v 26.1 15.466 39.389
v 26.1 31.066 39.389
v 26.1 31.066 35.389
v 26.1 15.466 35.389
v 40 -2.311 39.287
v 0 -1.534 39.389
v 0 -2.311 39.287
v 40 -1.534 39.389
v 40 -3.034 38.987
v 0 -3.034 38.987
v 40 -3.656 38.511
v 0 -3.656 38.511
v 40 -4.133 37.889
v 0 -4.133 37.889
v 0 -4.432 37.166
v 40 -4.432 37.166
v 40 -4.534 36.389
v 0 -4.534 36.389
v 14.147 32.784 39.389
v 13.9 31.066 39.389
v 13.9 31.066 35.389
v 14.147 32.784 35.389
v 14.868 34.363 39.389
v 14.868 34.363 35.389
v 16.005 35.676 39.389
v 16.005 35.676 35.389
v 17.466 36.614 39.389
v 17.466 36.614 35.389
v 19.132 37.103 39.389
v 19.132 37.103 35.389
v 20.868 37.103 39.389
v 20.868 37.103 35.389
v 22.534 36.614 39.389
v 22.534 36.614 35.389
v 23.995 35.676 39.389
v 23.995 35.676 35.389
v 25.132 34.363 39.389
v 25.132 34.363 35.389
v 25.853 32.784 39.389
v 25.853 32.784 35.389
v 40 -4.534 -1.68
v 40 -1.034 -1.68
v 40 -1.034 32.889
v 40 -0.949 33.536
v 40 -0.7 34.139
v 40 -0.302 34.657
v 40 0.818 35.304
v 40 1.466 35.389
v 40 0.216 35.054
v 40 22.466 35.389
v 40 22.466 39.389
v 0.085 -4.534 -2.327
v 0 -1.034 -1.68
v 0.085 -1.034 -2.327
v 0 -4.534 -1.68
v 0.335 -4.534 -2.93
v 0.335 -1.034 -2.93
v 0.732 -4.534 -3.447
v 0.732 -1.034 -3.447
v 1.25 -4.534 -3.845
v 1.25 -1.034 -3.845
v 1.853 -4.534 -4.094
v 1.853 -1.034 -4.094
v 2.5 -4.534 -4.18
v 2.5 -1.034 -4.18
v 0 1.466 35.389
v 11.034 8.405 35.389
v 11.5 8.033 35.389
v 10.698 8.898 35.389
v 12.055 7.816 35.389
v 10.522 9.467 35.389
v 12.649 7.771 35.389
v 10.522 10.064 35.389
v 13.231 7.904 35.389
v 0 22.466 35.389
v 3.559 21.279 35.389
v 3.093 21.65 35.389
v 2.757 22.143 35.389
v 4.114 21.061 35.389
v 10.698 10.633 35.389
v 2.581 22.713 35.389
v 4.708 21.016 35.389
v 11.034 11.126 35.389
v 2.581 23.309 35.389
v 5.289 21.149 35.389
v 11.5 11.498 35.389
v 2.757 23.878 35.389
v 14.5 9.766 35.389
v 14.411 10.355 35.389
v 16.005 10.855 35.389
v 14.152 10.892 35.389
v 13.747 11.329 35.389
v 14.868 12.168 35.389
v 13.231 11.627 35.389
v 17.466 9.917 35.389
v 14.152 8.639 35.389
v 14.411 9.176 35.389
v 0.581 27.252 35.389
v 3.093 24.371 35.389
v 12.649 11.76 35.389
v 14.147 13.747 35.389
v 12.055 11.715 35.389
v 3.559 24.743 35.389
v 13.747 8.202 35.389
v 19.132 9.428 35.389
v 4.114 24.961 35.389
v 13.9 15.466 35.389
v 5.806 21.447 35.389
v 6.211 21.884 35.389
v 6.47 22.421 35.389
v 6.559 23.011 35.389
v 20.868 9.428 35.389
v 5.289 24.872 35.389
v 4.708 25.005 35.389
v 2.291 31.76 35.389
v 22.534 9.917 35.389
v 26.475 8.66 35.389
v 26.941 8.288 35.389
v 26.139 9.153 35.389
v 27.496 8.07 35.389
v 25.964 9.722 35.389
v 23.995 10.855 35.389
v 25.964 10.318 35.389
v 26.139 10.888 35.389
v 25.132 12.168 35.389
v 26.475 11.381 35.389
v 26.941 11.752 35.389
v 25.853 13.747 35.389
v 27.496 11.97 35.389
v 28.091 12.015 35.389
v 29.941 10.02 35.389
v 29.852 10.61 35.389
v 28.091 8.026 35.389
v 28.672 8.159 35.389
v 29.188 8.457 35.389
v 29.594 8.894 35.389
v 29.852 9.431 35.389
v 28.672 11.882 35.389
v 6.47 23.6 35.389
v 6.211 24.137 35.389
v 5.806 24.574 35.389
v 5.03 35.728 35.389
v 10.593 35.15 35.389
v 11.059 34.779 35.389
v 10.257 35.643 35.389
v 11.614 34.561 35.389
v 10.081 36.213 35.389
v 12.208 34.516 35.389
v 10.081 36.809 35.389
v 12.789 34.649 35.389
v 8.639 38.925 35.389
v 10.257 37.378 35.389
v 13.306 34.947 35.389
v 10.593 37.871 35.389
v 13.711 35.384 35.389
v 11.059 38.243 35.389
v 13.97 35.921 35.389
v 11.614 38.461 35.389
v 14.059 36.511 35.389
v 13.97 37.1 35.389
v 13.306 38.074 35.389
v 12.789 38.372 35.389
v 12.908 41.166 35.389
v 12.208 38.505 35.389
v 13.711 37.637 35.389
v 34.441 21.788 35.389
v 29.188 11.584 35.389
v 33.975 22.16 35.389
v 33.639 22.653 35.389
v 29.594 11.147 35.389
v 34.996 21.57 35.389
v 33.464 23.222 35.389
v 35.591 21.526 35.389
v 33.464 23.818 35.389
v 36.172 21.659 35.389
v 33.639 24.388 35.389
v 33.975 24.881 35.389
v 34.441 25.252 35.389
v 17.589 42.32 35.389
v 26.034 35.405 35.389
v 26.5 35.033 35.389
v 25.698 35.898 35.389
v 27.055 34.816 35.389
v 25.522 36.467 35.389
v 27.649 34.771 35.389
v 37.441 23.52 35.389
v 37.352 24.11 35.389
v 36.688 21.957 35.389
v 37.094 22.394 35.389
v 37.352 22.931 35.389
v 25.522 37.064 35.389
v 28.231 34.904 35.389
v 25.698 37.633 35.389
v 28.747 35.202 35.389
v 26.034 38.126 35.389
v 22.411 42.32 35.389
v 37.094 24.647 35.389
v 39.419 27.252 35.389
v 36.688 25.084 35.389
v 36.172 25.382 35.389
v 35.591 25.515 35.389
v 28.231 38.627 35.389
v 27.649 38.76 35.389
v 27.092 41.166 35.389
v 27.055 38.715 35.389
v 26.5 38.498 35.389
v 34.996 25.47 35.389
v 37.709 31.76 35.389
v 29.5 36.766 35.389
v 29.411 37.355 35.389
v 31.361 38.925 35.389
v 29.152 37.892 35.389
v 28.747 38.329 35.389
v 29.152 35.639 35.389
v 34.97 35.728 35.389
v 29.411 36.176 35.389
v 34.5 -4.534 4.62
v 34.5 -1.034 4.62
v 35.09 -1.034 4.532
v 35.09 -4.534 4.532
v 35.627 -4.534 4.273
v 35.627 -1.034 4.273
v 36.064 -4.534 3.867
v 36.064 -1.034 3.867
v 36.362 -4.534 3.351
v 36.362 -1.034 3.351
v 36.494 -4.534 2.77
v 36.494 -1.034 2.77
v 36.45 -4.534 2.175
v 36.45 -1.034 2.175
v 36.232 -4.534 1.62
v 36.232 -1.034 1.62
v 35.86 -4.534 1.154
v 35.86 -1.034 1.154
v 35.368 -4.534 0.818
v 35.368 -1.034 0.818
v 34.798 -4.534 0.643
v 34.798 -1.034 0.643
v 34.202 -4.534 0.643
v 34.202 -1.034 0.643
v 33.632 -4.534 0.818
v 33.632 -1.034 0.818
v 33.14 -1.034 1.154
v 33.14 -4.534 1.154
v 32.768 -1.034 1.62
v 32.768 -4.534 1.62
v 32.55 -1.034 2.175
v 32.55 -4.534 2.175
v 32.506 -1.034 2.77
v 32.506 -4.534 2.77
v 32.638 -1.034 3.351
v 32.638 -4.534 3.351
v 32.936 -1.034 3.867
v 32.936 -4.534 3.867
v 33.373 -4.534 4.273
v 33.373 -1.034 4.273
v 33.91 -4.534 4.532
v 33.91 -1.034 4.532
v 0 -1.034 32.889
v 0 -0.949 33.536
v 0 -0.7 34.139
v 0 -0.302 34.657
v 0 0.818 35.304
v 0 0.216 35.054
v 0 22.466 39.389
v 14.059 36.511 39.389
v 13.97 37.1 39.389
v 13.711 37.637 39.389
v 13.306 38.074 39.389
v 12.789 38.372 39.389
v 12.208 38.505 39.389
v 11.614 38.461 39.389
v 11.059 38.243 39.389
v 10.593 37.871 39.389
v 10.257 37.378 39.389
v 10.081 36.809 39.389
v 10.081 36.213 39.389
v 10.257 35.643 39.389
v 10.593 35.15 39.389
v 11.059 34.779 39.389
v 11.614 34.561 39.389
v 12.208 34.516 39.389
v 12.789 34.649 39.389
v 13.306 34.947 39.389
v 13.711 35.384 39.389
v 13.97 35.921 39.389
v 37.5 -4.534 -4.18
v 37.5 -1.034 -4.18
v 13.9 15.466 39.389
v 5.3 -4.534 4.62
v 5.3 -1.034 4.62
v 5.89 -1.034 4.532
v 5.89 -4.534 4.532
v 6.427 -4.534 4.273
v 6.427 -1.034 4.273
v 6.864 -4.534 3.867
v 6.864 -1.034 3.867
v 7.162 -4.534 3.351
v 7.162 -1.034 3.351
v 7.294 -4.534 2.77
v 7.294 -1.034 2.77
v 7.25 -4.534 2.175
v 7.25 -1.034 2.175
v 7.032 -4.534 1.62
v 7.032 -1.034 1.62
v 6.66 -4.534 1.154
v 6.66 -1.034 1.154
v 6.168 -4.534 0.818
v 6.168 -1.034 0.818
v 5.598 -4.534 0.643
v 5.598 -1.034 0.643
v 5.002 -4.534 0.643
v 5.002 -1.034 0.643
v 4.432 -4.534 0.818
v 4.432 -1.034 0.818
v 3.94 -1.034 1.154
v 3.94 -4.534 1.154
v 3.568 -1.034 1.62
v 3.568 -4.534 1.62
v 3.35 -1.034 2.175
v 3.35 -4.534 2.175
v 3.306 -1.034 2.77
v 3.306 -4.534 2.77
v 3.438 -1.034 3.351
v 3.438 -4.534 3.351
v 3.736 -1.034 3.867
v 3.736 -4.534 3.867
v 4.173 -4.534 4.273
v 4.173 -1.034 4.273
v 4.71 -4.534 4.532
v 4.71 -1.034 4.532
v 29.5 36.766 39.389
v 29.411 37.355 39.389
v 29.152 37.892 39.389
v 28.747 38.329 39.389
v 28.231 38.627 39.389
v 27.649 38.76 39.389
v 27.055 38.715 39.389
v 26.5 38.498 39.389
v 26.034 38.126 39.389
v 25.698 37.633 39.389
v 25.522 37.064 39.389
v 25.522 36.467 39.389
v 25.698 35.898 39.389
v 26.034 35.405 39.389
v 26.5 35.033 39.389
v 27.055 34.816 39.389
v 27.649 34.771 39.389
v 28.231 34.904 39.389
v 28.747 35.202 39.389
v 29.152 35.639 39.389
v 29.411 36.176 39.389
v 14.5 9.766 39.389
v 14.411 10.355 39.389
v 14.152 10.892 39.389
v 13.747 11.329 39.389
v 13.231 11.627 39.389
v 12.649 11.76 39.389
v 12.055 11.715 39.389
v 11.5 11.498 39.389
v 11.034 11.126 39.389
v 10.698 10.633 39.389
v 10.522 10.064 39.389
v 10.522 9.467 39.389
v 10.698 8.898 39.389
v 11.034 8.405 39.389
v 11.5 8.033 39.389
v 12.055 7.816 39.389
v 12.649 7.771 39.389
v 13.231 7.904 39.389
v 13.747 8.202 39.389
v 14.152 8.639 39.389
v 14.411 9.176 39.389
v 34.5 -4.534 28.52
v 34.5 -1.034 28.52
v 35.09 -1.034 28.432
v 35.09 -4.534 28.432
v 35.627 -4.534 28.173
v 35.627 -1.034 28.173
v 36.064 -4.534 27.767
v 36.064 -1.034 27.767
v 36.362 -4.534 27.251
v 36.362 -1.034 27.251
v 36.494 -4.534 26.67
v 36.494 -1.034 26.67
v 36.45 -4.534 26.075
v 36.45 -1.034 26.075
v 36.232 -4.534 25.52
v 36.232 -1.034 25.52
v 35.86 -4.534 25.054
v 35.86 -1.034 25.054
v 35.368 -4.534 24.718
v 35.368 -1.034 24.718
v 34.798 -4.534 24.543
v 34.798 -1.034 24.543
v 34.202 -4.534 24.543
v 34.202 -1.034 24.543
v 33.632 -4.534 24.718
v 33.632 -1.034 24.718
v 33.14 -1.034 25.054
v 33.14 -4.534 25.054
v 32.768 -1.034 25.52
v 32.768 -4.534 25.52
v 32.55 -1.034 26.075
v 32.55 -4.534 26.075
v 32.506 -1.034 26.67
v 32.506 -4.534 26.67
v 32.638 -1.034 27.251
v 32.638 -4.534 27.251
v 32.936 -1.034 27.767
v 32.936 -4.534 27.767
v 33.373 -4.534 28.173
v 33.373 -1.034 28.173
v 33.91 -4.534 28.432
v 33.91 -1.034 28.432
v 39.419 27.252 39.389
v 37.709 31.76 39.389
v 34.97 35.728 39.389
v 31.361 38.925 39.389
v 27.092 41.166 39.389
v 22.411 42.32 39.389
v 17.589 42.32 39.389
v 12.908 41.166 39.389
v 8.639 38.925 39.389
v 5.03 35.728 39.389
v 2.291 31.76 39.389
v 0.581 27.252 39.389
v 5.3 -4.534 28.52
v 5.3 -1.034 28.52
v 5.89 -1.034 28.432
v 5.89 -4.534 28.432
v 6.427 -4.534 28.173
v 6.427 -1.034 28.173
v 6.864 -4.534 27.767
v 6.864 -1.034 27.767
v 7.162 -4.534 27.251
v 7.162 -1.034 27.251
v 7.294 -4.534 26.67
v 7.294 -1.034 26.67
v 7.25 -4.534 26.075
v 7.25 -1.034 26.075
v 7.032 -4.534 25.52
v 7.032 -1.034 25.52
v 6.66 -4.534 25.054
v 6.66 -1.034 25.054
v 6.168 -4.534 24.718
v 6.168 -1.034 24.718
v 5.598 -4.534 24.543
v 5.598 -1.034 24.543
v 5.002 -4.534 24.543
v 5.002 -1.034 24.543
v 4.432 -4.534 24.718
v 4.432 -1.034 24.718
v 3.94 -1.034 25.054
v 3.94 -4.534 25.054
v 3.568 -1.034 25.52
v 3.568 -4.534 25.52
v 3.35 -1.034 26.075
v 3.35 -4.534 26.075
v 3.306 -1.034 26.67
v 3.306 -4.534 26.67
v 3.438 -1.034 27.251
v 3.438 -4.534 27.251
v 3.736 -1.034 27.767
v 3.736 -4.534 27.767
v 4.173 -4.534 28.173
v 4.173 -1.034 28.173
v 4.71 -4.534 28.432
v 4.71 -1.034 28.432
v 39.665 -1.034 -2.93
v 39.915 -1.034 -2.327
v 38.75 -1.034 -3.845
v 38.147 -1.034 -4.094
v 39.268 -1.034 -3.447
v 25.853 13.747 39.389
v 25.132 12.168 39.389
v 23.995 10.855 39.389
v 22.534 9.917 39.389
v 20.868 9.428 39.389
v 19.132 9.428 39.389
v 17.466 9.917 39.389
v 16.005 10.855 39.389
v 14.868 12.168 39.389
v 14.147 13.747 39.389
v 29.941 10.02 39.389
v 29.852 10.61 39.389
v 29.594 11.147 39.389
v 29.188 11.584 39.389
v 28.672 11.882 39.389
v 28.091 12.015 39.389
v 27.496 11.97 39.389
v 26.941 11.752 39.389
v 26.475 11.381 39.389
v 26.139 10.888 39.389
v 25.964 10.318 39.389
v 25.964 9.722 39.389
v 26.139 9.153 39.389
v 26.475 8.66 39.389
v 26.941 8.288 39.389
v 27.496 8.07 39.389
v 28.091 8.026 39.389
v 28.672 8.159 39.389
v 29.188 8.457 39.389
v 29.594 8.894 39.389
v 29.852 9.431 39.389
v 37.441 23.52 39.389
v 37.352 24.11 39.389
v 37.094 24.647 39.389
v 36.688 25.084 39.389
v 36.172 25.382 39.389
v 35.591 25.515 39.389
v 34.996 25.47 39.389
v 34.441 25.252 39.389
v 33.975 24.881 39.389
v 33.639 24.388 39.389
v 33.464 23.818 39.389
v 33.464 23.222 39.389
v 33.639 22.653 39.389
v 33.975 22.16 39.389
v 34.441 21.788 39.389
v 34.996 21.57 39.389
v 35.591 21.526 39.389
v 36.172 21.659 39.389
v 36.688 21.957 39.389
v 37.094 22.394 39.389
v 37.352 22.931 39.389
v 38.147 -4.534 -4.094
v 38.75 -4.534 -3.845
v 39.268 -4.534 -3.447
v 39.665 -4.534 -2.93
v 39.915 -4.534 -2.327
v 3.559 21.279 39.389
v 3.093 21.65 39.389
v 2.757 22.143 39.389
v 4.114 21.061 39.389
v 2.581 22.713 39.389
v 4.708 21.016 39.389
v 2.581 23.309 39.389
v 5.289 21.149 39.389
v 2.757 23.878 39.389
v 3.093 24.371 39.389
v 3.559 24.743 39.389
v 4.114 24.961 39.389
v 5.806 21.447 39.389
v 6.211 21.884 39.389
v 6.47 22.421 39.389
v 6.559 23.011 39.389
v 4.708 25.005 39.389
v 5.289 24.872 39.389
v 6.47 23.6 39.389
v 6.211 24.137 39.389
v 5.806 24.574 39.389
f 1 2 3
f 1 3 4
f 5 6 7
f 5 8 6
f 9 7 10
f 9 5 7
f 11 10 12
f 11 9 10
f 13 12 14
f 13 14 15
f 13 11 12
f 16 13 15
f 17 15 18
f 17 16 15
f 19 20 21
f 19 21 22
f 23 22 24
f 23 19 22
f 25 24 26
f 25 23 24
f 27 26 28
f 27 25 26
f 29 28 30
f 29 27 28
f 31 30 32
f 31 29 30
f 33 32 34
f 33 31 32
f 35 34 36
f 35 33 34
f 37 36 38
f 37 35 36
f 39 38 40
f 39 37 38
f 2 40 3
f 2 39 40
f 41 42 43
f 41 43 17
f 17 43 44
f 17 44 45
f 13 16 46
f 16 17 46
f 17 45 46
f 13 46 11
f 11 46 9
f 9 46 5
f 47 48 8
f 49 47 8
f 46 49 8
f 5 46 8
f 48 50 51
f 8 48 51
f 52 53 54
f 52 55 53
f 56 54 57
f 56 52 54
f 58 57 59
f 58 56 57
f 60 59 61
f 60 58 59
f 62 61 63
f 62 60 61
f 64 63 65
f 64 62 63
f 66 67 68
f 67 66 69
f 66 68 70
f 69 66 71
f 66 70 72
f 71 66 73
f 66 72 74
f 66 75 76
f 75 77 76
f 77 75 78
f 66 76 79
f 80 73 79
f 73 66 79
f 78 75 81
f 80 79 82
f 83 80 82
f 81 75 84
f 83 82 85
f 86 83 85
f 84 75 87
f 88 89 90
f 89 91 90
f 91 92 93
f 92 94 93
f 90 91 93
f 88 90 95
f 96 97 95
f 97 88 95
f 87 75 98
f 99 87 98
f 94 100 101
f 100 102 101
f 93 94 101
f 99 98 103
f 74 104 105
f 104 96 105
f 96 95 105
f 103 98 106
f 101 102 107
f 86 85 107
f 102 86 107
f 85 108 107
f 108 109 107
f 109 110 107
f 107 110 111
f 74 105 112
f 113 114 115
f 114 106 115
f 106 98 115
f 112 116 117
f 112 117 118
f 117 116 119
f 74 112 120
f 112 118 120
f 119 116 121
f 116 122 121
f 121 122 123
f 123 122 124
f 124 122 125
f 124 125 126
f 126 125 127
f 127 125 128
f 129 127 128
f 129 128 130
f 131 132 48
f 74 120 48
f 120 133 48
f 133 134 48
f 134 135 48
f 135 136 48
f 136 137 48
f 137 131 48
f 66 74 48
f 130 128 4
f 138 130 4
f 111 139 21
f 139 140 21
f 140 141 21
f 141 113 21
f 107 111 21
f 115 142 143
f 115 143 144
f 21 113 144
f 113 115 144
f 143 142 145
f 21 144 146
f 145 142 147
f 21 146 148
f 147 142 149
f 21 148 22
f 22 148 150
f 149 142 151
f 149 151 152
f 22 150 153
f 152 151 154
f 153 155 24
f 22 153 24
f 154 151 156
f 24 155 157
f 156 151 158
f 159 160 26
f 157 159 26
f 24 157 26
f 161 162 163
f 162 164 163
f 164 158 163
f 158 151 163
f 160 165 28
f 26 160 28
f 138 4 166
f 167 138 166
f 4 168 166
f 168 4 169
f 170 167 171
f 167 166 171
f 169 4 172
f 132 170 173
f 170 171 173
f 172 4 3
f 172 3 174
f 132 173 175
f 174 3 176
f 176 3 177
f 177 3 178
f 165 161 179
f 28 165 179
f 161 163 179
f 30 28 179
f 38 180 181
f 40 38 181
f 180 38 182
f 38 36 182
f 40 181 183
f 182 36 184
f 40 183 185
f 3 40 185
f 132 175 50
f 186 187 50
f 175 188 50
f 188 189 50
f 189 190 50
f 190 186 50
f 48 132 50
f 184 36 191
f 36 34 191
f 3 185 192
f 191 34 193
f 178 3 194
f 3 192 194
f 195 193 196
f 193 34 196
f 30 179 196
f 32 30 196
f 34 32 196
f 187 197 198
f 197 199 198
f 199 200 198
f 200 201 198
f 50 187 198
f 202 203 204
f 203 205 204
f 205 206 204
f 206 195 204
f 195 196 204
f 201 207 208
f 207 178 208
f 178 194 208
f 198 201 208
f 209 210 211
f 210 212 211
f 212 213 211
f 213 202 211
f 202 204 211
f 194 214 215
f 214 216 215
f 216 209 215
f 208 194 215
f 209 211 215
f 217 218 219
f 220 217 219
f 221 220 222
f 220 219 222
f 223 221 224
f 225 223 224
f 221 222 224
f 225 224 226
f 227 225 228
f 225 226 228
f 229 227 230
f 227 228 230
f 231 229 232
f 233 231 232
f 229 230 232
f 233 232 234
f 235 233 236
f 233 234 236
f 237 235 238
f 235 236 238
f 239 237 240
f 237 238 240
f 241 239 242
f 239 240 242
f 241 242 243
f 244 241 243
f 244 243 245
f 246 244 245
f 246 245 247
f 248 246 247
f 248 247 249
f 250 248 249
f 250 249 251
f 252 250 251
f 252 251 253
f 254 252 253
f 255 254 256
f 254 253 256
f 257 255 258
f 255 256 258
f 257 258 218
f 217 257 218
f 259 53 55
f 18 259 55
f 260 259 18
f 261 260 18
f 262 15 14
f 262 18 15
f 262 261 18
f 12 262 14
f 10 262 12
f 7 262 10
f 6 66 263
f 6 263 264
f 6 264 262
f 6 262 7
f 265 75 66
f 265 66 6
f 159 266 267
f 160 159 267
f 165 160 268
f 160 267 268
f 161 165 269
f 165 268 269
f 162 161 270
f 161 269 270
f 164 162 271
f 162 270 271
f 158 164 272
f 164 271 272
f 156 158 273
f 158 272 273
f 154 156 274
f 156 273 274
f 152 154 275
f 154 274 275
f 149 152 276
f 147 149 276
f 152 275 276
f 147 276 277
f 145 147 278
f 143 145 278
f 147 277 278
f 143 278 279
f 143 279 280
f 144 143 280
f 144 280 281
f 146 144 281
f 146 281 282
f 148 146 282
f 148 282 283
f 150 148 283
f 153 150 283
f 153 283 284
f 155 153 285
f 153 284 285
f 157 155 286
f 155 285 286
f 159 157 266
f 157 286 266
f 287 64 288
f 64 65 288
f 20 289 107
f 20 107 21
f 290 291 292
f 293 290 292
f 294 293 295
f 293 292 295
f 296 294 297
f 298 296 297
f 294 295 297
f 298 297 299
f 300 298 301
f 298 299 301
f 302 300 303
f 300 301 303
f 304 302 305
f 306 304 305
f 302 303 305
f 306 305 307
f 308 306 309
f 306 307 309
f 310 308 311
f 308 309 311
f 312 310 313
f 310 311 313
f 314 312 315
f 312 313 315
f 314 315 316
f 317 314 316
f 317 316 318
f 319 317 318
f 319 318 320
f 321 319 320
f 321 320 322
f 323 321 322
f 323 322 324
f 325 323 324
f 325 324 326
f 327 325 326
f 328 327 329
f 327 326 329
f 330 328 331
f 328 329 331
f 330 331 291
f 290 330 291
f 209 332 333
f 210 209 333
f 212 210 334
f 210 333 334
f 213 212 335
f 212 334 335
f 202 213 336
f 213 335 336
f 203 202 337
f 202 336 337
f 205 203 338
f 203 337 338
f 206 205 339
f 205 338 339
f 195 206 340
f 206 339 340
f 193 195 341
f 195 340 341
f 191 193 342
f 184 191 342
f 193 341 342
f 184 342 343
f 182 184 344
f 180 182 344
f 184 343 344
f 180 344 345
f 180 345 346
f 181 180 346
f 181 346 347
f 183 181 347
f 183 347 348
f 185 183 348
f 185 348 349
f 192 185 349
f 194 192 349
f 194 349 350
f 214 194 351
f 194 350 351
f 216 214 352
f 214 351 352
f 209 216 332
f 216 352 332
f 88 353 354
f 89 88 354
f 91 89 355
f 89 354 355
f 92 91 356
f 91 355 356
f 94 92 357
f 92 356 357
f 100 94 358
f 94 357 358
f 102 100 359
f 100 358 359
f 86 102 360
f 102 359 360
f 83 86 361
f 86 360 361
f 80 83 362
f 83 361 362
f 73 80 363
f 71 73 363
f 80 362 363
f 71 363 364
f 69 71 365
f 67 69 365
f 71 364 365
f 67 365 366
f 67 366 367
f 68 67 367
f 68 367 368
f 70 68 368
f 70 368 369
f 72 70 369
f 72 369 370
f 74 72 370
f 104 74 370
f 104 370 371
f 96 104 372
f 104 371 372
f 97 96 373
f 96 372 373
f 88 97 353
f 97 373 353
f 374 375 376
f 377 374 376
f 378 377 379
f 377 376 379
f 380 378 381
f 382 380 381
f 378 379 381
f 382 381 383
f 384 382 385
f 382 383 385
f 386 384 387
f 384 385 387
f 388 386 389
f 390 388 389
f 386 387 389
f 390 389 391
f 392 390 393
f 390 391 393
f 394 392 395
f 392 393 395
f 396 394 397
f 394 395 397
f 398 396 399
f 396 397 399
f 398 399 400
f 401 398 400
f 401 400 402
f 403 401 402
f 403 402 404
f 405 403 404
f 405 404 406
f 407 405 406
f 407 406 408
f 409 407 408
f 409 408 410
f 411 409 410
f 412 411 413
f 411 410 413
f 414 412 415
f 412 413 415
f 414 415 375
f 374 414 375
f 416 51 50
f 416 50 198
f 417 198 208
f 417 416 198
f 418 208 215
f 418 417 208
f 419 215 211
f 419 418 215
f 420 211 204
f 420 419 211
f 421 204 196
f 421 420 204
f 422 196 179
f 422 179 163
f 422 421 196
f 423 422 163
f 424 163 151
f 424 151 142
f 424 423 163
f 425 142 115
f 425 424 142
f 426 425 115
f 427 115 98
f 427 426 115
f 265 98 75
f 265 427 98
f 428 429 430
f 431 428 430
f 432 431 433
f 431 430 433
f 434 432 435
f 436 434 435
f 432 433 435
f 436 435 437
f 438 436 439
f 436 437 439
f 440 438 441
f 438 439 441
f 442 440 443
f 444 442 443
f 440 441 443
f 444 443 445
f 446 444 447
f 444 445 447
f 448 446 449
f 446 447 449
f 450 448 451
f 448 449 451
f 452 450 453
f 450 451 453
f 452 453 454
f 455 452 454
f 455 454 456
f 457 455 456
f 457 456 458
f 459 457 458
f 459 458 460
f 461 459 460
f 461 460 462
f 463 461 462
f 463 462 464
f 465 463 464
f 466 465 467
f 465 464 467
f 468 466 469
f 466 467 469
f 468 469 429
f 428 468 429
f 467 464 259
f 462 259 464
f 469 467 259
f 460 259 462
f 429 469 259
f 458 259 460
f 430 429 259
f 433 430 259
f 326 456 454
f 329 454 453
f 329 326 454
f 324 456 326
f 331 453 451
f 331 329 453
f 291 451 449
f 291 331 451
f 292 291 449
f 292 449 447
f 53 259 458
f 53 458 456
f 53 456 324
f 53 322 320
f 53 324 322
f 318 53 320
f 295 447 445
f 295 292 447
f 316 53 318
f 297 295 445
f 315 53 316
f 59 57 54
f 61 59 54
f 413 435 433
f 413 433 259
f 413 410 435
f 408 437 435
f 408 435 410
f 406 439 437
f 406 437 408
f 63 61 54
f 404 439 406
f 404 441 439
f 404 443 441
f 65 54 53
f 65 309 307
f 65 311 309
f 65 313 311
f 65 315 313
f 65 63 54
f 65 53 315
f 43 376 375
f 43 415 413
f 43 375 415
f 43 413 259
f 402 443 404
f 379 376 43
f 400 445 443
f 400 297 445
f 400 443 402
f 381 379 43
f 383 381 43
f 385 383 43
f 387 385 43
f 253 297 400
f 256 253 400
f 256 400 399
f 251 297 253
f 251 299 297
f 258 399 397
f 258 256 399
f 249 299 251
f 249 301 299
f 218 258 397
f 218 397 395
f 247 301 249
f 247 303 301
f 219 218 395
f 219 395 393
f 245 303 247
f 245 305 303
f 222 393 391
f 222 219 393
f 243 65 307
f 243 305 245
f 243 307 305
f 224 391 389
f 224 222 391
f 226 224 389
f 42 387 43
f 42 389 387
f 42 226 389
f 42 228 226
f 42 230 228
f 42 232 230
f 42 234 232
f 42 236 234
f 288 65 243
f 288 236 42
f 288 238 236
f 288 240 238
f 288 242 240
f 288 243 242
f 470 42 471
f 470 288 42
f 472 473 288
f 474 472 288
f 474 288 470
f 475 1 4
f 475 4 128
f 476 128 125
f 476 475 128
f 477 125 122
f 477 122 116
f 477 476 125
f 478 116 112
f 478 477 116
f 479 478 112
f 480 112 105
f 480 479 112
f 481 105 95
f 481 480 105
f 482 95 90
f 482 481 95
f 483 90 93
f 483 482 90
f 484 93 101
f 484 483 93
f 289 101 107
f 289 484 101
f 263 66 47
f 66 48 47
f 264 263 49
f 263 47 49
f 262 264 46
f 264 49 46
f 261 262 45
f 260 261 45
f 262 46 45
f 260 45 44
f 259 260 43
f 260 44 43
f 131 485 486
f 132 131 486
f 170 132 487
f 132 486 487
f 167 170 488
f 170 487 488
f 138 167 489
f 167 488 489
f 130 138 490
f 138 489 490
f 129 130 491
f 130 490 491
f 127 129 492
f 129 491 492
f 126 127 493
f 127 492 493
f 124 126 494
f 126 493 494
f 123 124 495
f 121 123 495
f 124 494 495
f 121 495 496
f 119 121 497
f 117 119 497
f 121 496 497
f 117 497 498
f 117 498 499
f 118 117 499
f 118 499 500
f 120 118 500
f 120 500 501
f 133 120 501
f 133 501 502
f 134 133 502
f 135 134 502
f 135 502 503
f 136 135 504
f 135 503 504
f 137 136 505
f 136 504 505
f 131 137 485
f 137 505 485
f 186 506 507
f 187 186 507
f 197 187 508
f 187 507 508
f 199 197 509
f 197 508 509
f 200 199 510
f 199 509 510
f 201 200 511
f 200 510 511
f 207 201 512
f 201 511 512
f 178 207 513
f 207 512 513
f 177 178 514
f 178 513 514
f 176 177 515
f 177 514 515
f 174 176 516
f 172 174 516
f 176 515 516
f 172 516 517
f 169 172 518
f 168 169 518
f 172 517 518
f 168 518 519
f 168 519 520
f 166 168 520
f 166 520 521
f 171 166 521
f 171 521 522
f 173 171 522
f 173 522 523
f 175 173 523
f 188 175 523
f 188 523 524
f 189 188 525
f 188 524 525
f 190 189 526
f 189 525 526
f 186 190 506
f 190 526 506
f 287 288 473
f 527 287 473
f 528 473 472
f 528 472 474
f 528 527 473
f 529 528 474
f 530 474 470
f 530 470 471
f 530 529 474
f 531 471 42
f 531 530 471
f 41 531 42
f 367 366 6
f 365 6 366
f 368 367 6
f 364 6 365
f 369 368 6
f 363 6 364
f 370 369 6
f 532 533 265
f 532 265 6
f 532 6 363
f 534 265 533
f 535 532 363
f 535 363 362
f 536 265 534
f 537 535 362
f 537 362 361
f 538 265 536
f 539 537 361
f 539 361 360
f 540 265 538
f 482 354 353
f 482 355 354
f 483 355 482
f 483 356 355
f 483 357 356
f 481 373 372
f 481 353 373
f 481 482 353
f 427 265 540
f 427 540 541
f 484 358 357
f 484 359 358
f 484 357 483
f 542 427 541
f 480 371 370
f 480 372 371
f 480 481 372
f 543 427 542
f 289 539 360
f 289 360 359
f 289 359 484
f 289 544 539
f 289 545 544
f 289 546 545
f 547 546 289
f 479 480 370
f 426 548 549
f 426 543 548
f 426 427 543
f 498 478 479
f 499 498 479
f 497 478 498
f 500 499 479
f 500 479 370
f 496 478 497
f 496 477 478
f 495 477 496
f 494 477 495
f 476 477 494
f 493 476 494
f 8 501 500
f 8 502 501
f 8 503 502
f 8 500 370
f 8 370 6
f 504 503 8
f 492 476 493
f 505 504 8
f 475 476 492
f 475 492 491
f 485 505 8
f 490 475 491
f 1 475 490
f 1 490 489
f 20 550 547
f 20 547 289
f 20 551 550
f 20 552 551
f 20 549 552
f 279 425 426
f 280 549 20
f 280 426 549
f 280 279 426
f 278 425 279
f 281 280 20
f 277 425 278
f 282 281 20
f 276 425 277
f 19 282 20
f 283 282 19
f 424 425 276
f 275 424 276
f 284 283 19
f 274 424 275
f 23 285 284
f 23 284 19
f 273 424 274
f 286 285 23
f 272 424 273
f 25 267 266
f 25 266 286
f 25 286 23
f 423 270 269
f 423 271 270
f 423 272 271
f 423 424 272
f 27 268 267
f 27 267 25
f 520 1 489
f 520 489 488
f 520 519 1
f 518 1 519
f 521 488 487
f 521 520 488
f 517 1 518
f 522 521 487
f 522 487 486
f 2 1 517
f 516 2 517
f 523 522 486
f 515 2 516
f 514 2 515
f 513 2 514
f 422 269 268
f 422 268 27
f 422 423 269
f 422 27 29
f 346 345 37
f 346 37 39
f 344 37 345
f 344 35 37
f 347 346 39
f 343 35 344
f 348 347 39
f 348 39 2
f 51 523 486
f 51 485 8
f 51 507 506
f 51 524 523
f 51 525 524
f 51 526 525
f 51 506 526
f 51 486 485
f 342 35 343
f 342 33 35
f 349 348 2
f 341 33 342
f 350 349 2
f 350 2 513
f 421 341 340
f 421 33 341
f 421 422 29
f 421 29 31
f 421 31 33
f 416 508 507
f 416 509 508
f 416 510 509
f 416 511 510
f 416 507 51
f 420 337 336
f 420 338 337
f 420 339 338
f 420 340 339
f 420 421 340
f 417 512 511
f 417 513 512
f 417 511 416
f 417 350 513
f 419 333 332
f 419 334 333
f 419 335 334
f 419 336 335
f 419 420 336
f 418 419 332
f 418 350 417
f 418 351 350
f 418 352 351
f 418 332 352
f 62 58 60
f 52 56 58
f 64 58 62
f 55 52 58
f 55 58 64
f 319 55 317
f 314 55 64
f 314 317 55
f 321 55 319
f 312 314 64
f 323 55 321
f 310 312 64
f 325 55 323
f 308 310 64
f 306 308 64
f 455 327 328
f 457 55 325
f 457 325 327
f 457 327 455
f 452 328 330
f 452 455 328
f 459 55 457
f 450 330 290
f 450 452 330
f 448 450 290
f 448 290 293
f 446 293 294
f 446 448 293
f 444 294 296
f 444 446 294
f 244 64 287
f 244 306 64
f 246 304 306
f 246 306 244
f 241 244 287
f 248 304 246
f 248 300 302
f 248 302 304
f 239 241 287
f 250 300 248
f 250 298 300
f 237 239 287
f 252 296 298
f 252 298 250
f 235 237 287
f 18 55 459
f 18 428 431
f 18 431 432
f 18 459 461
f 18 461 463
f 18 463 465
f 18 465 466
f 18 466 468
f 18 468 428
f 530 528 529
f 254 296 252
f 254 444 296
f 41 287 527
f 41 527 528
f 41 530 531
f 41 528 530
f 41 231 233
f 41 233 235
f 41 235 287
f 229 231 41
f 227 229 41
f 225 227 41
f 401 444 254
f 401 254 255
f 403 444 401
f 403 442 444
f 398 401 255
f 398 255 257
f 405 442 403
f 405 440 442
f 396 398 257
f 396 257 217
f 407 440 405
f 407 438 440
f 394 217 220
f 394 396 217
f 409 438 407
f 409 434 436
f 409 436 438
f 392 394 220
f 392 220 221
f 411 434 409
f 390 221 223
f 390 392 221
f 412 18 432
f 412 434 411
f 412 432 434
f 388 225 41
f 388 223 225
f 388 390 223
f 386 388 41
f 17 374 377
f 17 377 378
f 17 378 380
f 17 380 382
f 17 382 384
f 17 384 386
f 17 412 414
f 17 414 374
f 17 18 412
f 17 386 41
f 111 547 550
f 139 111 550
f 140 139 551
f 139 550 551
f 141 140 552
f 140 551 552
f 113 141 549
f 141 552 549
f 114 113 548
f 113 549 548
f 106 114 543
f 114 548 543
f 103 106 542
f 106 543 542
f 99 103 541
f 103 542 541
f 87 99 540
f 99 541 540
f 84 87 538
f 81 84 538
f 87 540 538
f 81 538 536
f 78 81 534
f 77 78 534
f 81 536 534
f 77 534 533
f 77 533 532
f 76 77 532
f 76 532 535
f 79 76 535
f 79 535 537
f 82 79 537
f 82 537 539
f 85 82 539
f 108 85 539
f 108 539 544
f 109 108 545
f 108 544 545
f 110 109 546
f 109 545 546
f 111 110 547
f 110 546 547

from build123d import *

# Parameters (mm, degrees)
SKETCH2_W           = 1.5
SKETCH2_H           = 37.57
SKETCH2_H_2         = 1.5
SKETCH2_W_2         = 39.569
BOSS_EXTRUDE1_DEPTH = 40
SKETCH3_R           = 1.65
CUT_EXTRUDE1_DEPTH  = 40
SKETCH4_R           = 10.5
SKETCH4_R_2         = 1.65
CUT_EXTRUDE2_DEPTH  = 40
SKETCH_1_R          = 10.5
SKETCH_1_R_2        = 1.65
EXTRUDE_1_DEPTH     = 2.5
FILLET_1_R          = 2.5
SKETCH_2_W          = 40
SKETCH_2_H          = 43.569
SKETCH_2_R          = 1.65
EXTRUDE_2_DEPTH     = 2
FILLET_2_R          = 2.5
SKETCH_3_R          = 1.65
EXTRUDE_3_DEPTH     = 3.5
SKETCH_4_R          = 2
CUT_EXTRUDE_1_DEPTH = 3.5
FILLET_3_R          = 3
SKETCH_5_W          = 40
SKETCH_5_H          = 4
EXTRUDE_4_DEPTH     = 27
FILLET_4_R          = 3
EXTRUDE_5_DEPTH     = 4
CUT_EXTRUDE_2_DEPTH = 4
SKETCH_10_R         = 2
CUT_EXTRUDE_3_DEPTH = 4


with BuildPart() as part:
    # Sketch2 → Boss-Extrude1 (new body)
    with BuildSketch(Plane(origin=(0, 0, 0), x_dir=(0, 0, -1), z_dir=(1, 0, 0))):
        with Locations((-36.139408466, 17.750517241)):
            Rectangle(SKETCH2_W, SKETCH2_H)
        with Locations((-36.139408466, -1.784482759)):
            Rectangle(SKETCH2_W, SKETCH2_H_2)
        with Locations((-15.604908466, -1.784482759)):
            Rectangle(SKETCH2_W_2, SKETCH2_H_2)
    extrude(amount=BOSS_EXTRUDE1_DEPTH)

    # Sketch3 → Cut-Extrude1 (cut)
    with BuildSketch(Plane(origin=(0, -1.034482759, 0), x_dir=(1, 0, 0), z_dir=(0, 1, 0))):
        with Locations(Location((4.5, -30.820408466, 0), (0, 0, 270))):
            Circle(SKETCH3_R)
        with Locations(Location((4.5, -20.820408466, 0), (0, 0, 270))):
            Circle(SKETCH3_R)
        with Locations(Location((4.5, -10.820408466, 0), (0, 0, 270))):
            Circle(SKETCH3_R)
        with Locations(Location((4.5, -0.820408466, 0), (0, 0, 270))):
            Circle(SKETCH3_R)
        with Locations(Location((35.5, -30.820408466, 0), (0, 0, 270))):
            Circle(SKETCH3_R)
        with Locations(Location((35.5, -20.820408466, 0), (0, 0, 270))):
            Circle(SKETCH3_R)
        with Locations(Location((35.5, -10.820408466, 0), (0, 0, 270))):
            Circle(SKETCH3_R)
        with Locations(Location((35.5, -0.820408466, 0), (0, 0, 270))):
            Circle(SKETCH3_R)
    extrude(amount=-CUT_EXTRUDE1_DEPTH, mode=Mode.SUBTRACT)

    # Sketch4 → Cut-Extrude2 (cut)
    with BuildSketch(Plane(origin=(0, 0, 35.389408466), x_dir=(-1, 0, 0), z_dir=(0, 0, -1))):
        with Locations(Location((-20, 16.535517241, 0), (0, 0, 90))):
            Circle(SKETCH4_R)
        with Locations(Location((-11.070998723, 25.983952889, 0), (0, 0, 90))):
            Circle(SKETCH4_R_2)
        with Locations(Location((-10.551564352, 7.606515964, 0), (0, 0, 90))):
            Circle(SKETCH4_R_2)
        with Locations(Location((-29.448435648, 25.464518519, 0), (0, 0, 90))):
            Circle(SKETCH4_R_2)
        with Locations(Location((-28.929001277, 7.087081594, 0), (0, 0, 90))):
            Circle(SKETCH4_R_2)
        with BuildLine():
            Line((-40, 36.535517241), (-40, 16.535517241))
            ThreePointArc((-40, 16.535517241), (-34.142135624, 30.677652865), (-20, 36.535517241))
            Line((-20, 36.535517241), (-40, 36.535517241))
        make_face()
        with BuildLine():
            Line((0, 36.535517241), (-20, 36.535517241))
            ThreePointArc((-20, 36.535517241), (-5.857864785, 30.677653274), (0, 16.535518399))
            Line((0, 16.535518399), (0, 36.535517241))
        make_face()
    extrude(amount=-CUT_EXTRUDE2_DEPTH, mode=Mode.SUBTRACT)

    # 草图1 → 凸台-拉伸1 (add)
    with BuildSketch(Plane.XY.offset(36.889408466)):
        with BuildLine():
            Line((0, 16.535517241), (0, -2.534482759))
            Line((0, -2.534482759), (40, -2.534482759))
            Line((40, -2.534482759), (40, 16.535517241))
            ThreePointArc((40, 16.535517241), (20, 36.535517241), (0, 16.535517241))
        make_face()
        with Locations(Location((20, 16.535517241, 0), (0, 0, 90))):
            Circle(SKETCH_1_R, mode=Mode.SUBTRACT)
        with Locations(Location((11.070998723, 25.983952889, 0), (0, 0, 90))):
            Circle(SKETCH_1_R_2, mode=Mode.SUBTRACT)
        with Locations(Location((29.448435648, 25.464518519, 0), (0, 0, 90))):
            Circle(SKETCH_1_R_2, mode=Mode.SUBTRACT)
        with Locations(Location((28.929001277, 7.087081594, 0), (0, 0, 90))):
            Circle(SKETCH_1_R_2, mode=Mode.SUBTRACT)
        with Locations(Location((10.551564352, 7.606515964, 0), (0, 0, 90))):
            Circle(SKETCH_1_R_2, mode=Mode.SUBTRACT)
    extrude(amount=EXTRUDE_1_DEPTH)

    # 圆角1
    fillet_1_edges = [part.edges().sort_by_distance(p)[0] for p in [
        (20, -1.034482759, 35.389408466),
    ]]
    fillet(fillet_1_edges, radius=FILLET_1_R)

    # 草图2 → 凸台-拉伸2 (add)
    with BuildSketch(Plane.XZ.offset(2.534482759)):
        with Locations((20, 17.604908466)):
            Rectangle(SKETCH_2_W, SKETCH_2_H)
        with Locations(Location((4.5, 30.820408466, 0), (0, 0, 90))):
            Circle(SKETCH_2_R, mode=Mode.SUBTRACT)
        with Locations(Location((4.5, 20.820408466, 0), (0, 0, 90))):
            Circle(SKETCH_2_R, mode=Mode.SUBTRACT)
        with Locations(Location((4.5, 0.820408466, 0), (0, 0, 90))):
            Circle(SKETCH_2_R, mode=Mode.SUBTRACT)
        with Locations(Location((4.5, 10.820408466, 0), (0, 0, 90))):
            Circle(SKETCH_2_R, mode=Mode.SUBTRACT)
        with Locations(Location((35.5, 30.820408466, 0), (0, 0, 90))):
            Circle(SKETCH_2_R, mode=Mode.SUBTRACT)
        with Locations(Location((35.5, 20.820408466, 0), (0, 0, 90))):
            Circle(SKETCH_2_R, mode=Mode.SUBTRACT)
        with Locations(Location((35.5, 10.820408466, 0), (0, 0, 90))):
            Circle(SKETCH_2_R, mode=Mode.SUBTRACT)
        with Locations(Location((35.5, 0.820408466, 0), (0, 0, 90))):
            Circle(SKETCH_2_R, mode=Mode.SUBTRACT)
    extrude(amount=EXTRUDE_2_DEPTH)

    # 圆角2
    fillet_2_edges = [part.edges().sort_by_distance(p)[0] for p in [
        (40, -3.534482759, -4.179591534),
        (0, -3.534482759, -4.179591534),
    ]]
    fillet(fillet_2_edges, radius=FILLET_2_R)

    # 草图3 → 凸台-拉伸3 (add)
    with BuildSketch(Plane(origin=(0, -1.034482759, 0), x_dir=(1, 0, 0), z_dir=(0, 1, 0))):
        with Locations((35.5, -0.820408466)):
            Circle(SKETCH_3_R)
        with Locations((35.5, -10.820408466)):
            Circle(SKETCH_3_R)
        with Locations((35.5, -20.820408466)):
            Circle(SKETCH_3_R)
        with Locations((35.5, -30.820408466)):
            Circle(SKETCH_3_R)
        with Locations((4.5, -0.820408466)):
            Circle(SKETCH_3_R)
        with Locations((4.5, -10.820408466)):
            Circle(SKETCH_3_R)
        with Locations((4.5, -20.820408466)):
            Circle(SKETCH_3_R)
        with Locations((4.5, -30.820408466)):
            Circle(SKETCH_3_R)
    extrude(amount=-EXTRUDE_3_DEPTH)

    # 草图4 → 切除-拉伸1 (cut)
    with BuildSketch(Plane(origin=(0, -1.034482759, 0), x_dir=(1, 0, 0), z_dir=(0, 1, 0))):
        with Locations(Location((34.5, -2.620408466, 0), (0, 0, 270))):
            Circle(SKETCH_4_R)
        with Locations(Location((34.5, -26.520408466, 0), (0, 0, 270))):
            Circle(SKETCH_4_R)
        with Locations(Location((5.3, -2.620408466, 0), (0, 0, 270))):
            Circle(SKETCH_4_R)
        with Locations(Location((5.3, -26.520408466, 0), (0, 0, 270))):
            Circle(SKETCH_4_R)
    extrude(amount=-CUT_EXTRUDE_1_DEPTH, mode=Mode.SUBTRACT)

    # 圆角3
    fillet_3_edges = [part.edges().sort_by_distance(p)[0] for p in [
        (20, -4.534482759, 39.389408466),
    ]]
    fillet(fillet_3_edges, radius=FILLET_3_R)

    # 草图5 → 凸台-拉伸4 (add)
    with BuildSketch(Plane.XZ.offset(4.534482759)):
        with Locations((20, 37.389408466)):
            Rectangle(SKETCH_5_W, SKETCH_5_H)
    extrude(amount=-EXTRUDE_4_DEPTH)

    # 圆角4
    fillet_4_edges = [part.edges().sort_by_distance(p)[0] for p in [
        (20, -4.534482759, 39.389408466),
    ]]
    fillet(fillet_4_edges, radius=FILLET_4_R)

    # 草图7 → 凸台-拉伸5 (add)
    with BuildSketch(Plane.XY.offset(39.389408466)):
        with BuildLine():
            Line((0, 22.465517241), (40, 22.465517241))
            ThreePointArc((40, 22.465517241), (20, 42.465517241), (0, 22.465517241))
        make_face()
    extrude(amount=-EXTRUDE_5_DEPTH)

    # 草图8 → 切除-拉伸2 (cut)
    with BuildSketch(Plane.XY.offset(39.389408466)):
        with BuildLine():
            Line((26.1, 31.065517241), (26.1, 15.465517241))
            ThreePointArc((26.1, 15.465517241), (20, 9.365517241), (13.9, 15.465517241))
            Line((13.9, 15.465517241), (13.9, 31.065517241))
            ThreePointArc((13.9, 31.065517241), (20, 37.165517241), (26.1, 31.065517241))
        make_face()
    extrude(amount=-CUT_EXTRUDE_2_DEPTH, mode=Mode.SUBTRACT)

    # 草图10 → 切除-拉伸3 (cut)
    with BuildSketch(Plane.XY.offset(39.389408466)):
        with Locations((12.5, 9.765517241)):
            Circle(SKETCH_10_R)
        with Locations((27.941342951, 10.020326713)):
            Circle(SKETCH_10_R)
        with Locations((35.441342951, 23.520326713)):
            Circle(SKETCH_10_R)
        with Locations((27.5, 36.765517241)):
            Circle(SKETCH_10_R)
        with Locations((12.058657049, 36.51070777)):
            Circle(SKETCH_10_R)
        with Locations((4.558657049, 23.01070777)):
            Circle(SKETCH_10_R)
    extrude(amount=-CUT_EXTRUDE_3_DEPTH, mode=Mode.SUBTRACT)


solid = part.part
